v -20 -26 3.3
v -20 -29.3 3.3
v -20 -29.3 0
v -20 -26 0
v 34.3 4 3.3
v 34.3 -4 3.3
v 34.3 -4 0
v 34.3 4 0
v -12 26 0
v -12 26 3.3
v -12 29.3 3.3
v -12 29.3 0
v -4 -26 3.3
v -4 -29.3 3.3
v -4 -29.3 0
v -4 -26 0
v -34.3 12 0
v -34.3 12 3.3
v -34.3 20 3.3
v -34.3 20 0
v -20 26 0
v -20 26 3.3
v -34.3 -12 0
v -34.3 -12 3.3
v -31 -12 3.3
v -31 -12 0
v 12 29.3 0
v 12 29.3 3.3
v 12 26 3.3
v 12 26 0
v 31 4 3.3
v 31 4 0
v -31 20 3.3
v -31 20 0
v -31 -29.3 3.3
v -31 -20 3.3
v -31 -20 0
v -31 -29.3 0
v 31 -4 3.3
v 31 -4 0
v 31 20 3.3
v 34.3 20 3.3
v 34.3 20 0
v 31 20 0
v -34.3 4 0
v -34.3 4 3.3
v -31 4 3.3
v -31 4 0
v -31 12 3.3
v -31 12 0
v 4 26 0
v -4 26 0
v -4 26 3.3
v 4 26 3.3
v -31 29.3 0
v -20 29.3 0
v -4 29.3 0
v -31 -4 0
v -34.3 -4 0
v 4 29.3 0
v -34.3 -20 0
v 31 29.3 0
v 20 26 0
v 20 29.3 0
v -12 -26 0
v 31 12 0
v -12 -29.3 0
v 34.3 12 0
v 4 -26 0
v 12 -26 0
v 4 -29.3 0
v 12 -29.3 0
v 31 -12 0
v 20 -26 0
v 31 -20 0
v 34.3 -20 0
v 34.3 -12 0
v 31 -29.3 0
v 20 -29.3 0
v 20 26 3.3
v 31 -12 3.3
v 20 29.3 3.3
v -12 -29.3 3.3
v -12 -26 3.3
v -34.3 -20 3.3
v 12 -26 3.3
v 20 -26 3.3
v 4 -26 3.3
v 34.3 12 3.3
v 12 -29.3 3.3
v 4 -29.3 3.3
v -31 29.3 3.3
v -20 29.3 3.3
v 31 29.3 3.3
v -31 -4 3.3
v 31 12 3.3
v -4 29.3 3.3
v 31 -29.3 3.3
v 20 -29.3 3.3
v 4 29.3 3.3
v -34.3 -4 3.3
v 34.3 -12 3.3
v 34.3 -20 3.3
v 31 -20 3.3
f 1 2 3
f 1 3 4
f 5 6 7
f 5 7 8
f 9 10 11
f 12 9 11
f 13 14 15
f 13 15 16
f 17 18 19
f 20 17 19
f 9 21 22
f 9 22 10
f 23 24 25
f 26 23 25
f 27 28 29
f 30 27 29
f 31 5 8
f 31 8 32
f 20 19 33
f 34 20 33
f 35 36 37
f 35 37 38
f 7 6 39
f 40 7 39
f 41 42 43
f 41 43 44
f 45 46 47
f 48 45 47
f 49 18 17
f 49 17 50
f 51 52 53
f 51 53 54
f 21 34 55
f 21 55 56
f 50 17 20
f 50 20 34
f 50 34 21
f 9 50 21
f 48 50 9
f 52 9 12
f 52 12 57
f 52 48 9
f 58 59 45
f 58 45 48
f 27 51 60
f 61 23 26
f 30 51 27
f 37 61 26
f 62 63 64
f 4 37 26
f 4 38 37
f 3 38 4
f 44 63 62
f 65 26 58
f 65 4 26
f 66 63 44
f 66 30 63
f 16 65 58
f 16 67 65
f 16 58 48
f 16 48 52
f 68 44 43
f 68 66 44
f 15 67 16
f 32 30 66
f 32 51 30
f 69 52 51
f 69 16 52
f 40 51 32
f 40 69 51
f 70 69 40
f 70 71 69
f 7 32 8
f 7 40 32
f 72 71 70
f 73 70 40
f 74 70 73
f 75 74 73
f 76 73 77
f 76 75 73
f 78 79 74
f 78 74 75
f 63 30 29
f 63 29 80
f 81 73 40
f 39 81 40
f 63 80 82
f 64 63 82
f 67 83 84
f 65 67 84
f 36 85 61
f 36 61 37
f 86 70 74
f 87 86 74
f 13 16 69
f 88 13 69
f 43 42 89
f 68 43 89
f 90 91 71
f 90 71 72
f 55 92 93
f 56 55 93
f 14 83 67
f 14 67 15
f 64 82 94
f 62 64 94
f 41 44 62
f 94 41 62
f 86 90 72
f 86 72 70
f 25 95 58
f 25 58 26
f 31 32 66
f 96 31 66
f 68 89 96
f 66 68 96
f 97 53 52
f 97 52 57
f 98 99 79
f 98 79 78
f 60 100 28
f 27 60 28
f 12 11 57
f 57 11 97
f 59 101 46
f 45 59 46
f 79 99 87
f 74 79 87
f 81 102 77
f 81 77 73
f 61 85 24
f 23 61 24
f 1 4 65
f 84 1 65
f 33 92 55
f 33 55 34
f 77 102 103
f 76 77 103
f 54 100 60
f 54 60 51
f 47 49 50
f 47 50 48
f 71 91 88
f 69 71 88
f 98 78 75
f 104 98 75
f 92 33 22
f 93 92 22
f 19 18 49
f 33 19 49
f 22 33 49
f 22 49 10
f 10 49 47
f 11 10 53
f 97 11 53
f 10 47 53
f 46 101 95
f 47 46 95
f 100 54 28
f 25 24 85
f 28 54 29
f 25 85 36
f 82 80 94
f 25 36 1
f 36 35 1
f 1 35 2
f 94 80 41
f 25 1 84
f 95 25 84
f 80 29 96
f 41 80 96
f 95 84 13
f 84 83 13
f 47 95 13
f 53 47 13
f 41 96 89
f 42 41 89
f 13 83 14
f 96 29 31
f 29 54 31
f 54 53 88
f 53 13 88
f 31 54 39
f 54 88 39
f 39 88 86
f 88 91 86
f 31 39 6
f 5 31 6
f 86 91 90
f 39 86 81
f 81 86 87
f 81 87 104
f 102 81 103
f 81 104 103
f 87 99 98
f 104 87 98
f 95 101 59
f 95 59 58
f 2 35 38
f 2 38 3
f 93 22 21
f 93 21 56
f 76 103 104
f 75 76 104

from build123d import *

# Parameters (mm, degrees)
ESQUISSE1_W                    = 62
ESQUISSE1_H                    = 52
BOSS_EXTRU_1_DEPTH             = 3.3
ESQUISSE2_W                    = 8
ESQUISSE2_H                    = 3.3
BOSS_EXTRU_2_DEPTH             = 3.3
R_P_TITION_LIN_AIRE1_COUNT     = 2
R_P_TITION_LIN_AIRE1_PITCH     = 16
R_P_TITION_LIN_AIRE1_COL_COUNT = 3
R_P_TITION_LIN_AIRE1_COL_PITCH = 16
SYM_TRIE1_COPY_1_SKETCH_W      = 8
SYM_TRIE1_COPY_1_SKETCH_H      = 3.3
SYM_TRIE1_COPY_1_DEPTH         = 3.3
SYM_TRIE1_COPY_2_SKETCH_W      = 8
SYM_TRIE1_COPY_2_SKETCH_H      = 3.3
SYM_TRIE1_COPY_2_DEPTH         = 3.3
SYM_TRIE1_COPY_3_SKETCH_W      = 8
SYM_TRIE1_COPY_3_SKETCH_H      = 3.3
SYM_TRIE1_COPY_3_DEPTH         = 3.3
ESQUISSE3_W                    = 3
ESQUISSE3_H                    = 3.3
BOSS_EXTRU_3_DEPTH             = 3.3
ESQUISSE4_W                    = 3.3
ESQUISSE4_H                    = 8
BOSS_EXTRU_4_DEPTH             = 3.3
R_P_TITION_LIN_AIRE2_COUNT     = 2
R_P_TITION_LIN_AIRE2_PITCH     = 16
R_P_TITION_LIN_AIRE2_COL_COUNT = 2
R_P_TITION_LIN_AIRE2_COL_PITCH = 16
SYM_TRIE3_COPY_1_SKETCH_W      = 3.3
SYM_TRIE3_COPY_1_SKETCH_H      = 8
SYM_TRIE3_COPY_1_DEPTH         = 3.3
SYM_TRIE3_COPY_2_SKETCH_W      = 3.3
SYM_TRIE3_COPY_2_SKETCH_H      = 8
SYM_TRIE3_COPY_2_DEPTH         = 3.3


with BuildPart() as part:
    # Esquisse1 → Boss.-Extru.1 (new body)
    with BuildSketch(Plane.XY):
        Rectangle(ESQUISSE1_W, ESQUISSE1_H)
    extrude(amount=BOSS_EXTRU_1_DEPTH)

    # Esquisse2 → Boss.-Extru.2 (add)
    with BuildSketch(Plane.XY.offset(3.3)):
        with Locations((8, -27.65)):
            Rectangle(ESQUISSE2_W, ESQUISSE2_H)
    boss_extru_2 = extrude(amount=-BOSS_EXTRU_2_DEPTH)

    # Répétition linéaire1: Boss.-Extru.2 ×2
    with Locations(*[(i * R_P_TITION_LIN_AIRE1_PITCH, 0, 0) for i in range(1, R_P_TITION_LIN_AIRE1_COUNT)]):
        add(boss_extru_2)

    # Répétition linéaire1 col: Boss.-Extru.2 ×3
    with Locations(*[(-i * R_P_TITION_LIN_AIRE1_COL_PITCH, 0, 0) for i in range(1, R_P_TITION_LIN_AIRE1_COL_COUNT)]):
        add(boss_extru_2)

    # Symétrie1: Boss.-Extru.2 across plane
    add(boss_extru_2.mirror(Plane.ZX))

    # Symétrie1 copy 1 sketch → Symétrie1 copy 1 (add)
    with BuildSketch(Plane(origin=(16, 0, 3.3), x_dir=(1, 0, 0), z_dir=(0, 0, 1))):
        with Locations((8, 27.65)):
            Rectangle(SYM_TRIE1_COPY_1_SKETCH_W, SYM_TRIE1_COPY_1_SKETCH_H)
    extrude(amount=-SYM_TRIE1_COPY_1_DEPTH)

    # Symétrie1 copy 2 sketch → Symétrie1 copy 2 (add)
    with BuildSketch(Plane(origin=(-16, 0, 3.3), x_dir=(1, 0, 0), z_dir=(0, 0, 1))):
        with Locations((8, 27.65)):
            Rectangle(SYM_TRIE1_COPY_2_SKETCH_W, SYM_TRIE1_COPY_2_SKETCH_H)
    extrude(amount=-SYM_TRIE1_COPY_2_DEPTH)

    # Symétrie1 copy 3 sketch → Symétrie1 copy 3 (add)
    with BuildSketch(Plane(origin=(-32, 0, 3.3), x_dir=(1, 0, 0), z_dir=(0, 0, 1))):
        with Locations((8, 27.65)):
            Rectangle(SYM_TRIE1_COPY_3_SKETCH_W, SYM_TRIE1_COPY_3_SKETCH_H)
    extrude(amount=-SYM_TRIE1_COPY_3_DEPTH)

    # Esquisse3 → Boss.-Extru.3 (add)
    with BuildSketch(Plane.XY.offset(3.3)):
        with Locations((-29.5, 27.65)):
            Rectangle(ESQUISSE3_W, ESQUISSE3_H)
        with Locations((29.5, 27.65)):
            Rectangle(ESQUISSE3_W, ESQUISSE3_H)
    boss_extru_3 = extrude(amount=-BOSS_EXTRU_3_DEPTH)

    # Symétrie2: Boss.-Extru.3 across plane
    add(boss_extru_3.mirror(Plane.ZX))

    # Esquisse4 → Boss.-Extru.4 (add)
    with BuildSketch(Plane.XY.offset(3.3)):
        with Locations((-32.65, 0)):
            Rectangle(ESQUISSE4_W, ESQUISSE4_H)
    boss_extru_4 = extrude(amount=-BOSS_EXTRU_4_DEPTH)

    # Répétition linéaire2: Boss.-Extru.4 ×2
    with Locations(*[(0, i * R_P_TITION_LIN_AIRE2_PITCH, 0) for i in range(1, R_P_TITION_LIN_AIRE2_COUNT)]):
        add(boss_extru_4)

    # Répétition linéaire2 col: Boss.-Extru.4 ×2
    with Locations(*[(0, -i * R_P_TITION_LIN_AIRE2_COL_PITCH, 0) for i in range(1, R_P_TITION_LIN_AIRE2_COL_COUNT)]):
        add(boss_extru_4)

    # Symétrie3: Boss.-Extru.4 across plane
    add(boss_extru_4.mirror(Plane(origin=(0, 0, 0), x_dir=(0, 0, 1), z_dir=(1, 0, 0))))

    # Symétrie3 copy 1 sketch → Symétrie3 copy 1 (add)
    with BuildSketch(Plane(origin=(0, 16, 3.3), x_dir=(-1, 0, 0), z_dir=(0, 0, 1))):
        with Locations((-32.65, 0)):
            Rectangle(SYM_TRIE3_COPY_1_SKETCH_W, SYM_TRIE3_COPY_1_SKETCH_H)
    extrude(amount=-SYM_TRIE3_COPY_1_DEPTH)

    # Symétrie3 copy 2 sketch → Symétrie3 copy 2 (add)
    with BuildSketch(Plane(origin=(0, -16, 3.3), x_dir=(-1, 0, 0), z_dir=(0, 0, 1))):
        with Locations((-32.65, 0)):
            Rectangle(SYM_TRIE3_COPY_2_SKETCH_W, SYM_TRIE3_COPY_2_SKETCH_H)
    extrude(amount=-SYM_TRIE3_COPY_2_DEPTH)


solid = part.part
